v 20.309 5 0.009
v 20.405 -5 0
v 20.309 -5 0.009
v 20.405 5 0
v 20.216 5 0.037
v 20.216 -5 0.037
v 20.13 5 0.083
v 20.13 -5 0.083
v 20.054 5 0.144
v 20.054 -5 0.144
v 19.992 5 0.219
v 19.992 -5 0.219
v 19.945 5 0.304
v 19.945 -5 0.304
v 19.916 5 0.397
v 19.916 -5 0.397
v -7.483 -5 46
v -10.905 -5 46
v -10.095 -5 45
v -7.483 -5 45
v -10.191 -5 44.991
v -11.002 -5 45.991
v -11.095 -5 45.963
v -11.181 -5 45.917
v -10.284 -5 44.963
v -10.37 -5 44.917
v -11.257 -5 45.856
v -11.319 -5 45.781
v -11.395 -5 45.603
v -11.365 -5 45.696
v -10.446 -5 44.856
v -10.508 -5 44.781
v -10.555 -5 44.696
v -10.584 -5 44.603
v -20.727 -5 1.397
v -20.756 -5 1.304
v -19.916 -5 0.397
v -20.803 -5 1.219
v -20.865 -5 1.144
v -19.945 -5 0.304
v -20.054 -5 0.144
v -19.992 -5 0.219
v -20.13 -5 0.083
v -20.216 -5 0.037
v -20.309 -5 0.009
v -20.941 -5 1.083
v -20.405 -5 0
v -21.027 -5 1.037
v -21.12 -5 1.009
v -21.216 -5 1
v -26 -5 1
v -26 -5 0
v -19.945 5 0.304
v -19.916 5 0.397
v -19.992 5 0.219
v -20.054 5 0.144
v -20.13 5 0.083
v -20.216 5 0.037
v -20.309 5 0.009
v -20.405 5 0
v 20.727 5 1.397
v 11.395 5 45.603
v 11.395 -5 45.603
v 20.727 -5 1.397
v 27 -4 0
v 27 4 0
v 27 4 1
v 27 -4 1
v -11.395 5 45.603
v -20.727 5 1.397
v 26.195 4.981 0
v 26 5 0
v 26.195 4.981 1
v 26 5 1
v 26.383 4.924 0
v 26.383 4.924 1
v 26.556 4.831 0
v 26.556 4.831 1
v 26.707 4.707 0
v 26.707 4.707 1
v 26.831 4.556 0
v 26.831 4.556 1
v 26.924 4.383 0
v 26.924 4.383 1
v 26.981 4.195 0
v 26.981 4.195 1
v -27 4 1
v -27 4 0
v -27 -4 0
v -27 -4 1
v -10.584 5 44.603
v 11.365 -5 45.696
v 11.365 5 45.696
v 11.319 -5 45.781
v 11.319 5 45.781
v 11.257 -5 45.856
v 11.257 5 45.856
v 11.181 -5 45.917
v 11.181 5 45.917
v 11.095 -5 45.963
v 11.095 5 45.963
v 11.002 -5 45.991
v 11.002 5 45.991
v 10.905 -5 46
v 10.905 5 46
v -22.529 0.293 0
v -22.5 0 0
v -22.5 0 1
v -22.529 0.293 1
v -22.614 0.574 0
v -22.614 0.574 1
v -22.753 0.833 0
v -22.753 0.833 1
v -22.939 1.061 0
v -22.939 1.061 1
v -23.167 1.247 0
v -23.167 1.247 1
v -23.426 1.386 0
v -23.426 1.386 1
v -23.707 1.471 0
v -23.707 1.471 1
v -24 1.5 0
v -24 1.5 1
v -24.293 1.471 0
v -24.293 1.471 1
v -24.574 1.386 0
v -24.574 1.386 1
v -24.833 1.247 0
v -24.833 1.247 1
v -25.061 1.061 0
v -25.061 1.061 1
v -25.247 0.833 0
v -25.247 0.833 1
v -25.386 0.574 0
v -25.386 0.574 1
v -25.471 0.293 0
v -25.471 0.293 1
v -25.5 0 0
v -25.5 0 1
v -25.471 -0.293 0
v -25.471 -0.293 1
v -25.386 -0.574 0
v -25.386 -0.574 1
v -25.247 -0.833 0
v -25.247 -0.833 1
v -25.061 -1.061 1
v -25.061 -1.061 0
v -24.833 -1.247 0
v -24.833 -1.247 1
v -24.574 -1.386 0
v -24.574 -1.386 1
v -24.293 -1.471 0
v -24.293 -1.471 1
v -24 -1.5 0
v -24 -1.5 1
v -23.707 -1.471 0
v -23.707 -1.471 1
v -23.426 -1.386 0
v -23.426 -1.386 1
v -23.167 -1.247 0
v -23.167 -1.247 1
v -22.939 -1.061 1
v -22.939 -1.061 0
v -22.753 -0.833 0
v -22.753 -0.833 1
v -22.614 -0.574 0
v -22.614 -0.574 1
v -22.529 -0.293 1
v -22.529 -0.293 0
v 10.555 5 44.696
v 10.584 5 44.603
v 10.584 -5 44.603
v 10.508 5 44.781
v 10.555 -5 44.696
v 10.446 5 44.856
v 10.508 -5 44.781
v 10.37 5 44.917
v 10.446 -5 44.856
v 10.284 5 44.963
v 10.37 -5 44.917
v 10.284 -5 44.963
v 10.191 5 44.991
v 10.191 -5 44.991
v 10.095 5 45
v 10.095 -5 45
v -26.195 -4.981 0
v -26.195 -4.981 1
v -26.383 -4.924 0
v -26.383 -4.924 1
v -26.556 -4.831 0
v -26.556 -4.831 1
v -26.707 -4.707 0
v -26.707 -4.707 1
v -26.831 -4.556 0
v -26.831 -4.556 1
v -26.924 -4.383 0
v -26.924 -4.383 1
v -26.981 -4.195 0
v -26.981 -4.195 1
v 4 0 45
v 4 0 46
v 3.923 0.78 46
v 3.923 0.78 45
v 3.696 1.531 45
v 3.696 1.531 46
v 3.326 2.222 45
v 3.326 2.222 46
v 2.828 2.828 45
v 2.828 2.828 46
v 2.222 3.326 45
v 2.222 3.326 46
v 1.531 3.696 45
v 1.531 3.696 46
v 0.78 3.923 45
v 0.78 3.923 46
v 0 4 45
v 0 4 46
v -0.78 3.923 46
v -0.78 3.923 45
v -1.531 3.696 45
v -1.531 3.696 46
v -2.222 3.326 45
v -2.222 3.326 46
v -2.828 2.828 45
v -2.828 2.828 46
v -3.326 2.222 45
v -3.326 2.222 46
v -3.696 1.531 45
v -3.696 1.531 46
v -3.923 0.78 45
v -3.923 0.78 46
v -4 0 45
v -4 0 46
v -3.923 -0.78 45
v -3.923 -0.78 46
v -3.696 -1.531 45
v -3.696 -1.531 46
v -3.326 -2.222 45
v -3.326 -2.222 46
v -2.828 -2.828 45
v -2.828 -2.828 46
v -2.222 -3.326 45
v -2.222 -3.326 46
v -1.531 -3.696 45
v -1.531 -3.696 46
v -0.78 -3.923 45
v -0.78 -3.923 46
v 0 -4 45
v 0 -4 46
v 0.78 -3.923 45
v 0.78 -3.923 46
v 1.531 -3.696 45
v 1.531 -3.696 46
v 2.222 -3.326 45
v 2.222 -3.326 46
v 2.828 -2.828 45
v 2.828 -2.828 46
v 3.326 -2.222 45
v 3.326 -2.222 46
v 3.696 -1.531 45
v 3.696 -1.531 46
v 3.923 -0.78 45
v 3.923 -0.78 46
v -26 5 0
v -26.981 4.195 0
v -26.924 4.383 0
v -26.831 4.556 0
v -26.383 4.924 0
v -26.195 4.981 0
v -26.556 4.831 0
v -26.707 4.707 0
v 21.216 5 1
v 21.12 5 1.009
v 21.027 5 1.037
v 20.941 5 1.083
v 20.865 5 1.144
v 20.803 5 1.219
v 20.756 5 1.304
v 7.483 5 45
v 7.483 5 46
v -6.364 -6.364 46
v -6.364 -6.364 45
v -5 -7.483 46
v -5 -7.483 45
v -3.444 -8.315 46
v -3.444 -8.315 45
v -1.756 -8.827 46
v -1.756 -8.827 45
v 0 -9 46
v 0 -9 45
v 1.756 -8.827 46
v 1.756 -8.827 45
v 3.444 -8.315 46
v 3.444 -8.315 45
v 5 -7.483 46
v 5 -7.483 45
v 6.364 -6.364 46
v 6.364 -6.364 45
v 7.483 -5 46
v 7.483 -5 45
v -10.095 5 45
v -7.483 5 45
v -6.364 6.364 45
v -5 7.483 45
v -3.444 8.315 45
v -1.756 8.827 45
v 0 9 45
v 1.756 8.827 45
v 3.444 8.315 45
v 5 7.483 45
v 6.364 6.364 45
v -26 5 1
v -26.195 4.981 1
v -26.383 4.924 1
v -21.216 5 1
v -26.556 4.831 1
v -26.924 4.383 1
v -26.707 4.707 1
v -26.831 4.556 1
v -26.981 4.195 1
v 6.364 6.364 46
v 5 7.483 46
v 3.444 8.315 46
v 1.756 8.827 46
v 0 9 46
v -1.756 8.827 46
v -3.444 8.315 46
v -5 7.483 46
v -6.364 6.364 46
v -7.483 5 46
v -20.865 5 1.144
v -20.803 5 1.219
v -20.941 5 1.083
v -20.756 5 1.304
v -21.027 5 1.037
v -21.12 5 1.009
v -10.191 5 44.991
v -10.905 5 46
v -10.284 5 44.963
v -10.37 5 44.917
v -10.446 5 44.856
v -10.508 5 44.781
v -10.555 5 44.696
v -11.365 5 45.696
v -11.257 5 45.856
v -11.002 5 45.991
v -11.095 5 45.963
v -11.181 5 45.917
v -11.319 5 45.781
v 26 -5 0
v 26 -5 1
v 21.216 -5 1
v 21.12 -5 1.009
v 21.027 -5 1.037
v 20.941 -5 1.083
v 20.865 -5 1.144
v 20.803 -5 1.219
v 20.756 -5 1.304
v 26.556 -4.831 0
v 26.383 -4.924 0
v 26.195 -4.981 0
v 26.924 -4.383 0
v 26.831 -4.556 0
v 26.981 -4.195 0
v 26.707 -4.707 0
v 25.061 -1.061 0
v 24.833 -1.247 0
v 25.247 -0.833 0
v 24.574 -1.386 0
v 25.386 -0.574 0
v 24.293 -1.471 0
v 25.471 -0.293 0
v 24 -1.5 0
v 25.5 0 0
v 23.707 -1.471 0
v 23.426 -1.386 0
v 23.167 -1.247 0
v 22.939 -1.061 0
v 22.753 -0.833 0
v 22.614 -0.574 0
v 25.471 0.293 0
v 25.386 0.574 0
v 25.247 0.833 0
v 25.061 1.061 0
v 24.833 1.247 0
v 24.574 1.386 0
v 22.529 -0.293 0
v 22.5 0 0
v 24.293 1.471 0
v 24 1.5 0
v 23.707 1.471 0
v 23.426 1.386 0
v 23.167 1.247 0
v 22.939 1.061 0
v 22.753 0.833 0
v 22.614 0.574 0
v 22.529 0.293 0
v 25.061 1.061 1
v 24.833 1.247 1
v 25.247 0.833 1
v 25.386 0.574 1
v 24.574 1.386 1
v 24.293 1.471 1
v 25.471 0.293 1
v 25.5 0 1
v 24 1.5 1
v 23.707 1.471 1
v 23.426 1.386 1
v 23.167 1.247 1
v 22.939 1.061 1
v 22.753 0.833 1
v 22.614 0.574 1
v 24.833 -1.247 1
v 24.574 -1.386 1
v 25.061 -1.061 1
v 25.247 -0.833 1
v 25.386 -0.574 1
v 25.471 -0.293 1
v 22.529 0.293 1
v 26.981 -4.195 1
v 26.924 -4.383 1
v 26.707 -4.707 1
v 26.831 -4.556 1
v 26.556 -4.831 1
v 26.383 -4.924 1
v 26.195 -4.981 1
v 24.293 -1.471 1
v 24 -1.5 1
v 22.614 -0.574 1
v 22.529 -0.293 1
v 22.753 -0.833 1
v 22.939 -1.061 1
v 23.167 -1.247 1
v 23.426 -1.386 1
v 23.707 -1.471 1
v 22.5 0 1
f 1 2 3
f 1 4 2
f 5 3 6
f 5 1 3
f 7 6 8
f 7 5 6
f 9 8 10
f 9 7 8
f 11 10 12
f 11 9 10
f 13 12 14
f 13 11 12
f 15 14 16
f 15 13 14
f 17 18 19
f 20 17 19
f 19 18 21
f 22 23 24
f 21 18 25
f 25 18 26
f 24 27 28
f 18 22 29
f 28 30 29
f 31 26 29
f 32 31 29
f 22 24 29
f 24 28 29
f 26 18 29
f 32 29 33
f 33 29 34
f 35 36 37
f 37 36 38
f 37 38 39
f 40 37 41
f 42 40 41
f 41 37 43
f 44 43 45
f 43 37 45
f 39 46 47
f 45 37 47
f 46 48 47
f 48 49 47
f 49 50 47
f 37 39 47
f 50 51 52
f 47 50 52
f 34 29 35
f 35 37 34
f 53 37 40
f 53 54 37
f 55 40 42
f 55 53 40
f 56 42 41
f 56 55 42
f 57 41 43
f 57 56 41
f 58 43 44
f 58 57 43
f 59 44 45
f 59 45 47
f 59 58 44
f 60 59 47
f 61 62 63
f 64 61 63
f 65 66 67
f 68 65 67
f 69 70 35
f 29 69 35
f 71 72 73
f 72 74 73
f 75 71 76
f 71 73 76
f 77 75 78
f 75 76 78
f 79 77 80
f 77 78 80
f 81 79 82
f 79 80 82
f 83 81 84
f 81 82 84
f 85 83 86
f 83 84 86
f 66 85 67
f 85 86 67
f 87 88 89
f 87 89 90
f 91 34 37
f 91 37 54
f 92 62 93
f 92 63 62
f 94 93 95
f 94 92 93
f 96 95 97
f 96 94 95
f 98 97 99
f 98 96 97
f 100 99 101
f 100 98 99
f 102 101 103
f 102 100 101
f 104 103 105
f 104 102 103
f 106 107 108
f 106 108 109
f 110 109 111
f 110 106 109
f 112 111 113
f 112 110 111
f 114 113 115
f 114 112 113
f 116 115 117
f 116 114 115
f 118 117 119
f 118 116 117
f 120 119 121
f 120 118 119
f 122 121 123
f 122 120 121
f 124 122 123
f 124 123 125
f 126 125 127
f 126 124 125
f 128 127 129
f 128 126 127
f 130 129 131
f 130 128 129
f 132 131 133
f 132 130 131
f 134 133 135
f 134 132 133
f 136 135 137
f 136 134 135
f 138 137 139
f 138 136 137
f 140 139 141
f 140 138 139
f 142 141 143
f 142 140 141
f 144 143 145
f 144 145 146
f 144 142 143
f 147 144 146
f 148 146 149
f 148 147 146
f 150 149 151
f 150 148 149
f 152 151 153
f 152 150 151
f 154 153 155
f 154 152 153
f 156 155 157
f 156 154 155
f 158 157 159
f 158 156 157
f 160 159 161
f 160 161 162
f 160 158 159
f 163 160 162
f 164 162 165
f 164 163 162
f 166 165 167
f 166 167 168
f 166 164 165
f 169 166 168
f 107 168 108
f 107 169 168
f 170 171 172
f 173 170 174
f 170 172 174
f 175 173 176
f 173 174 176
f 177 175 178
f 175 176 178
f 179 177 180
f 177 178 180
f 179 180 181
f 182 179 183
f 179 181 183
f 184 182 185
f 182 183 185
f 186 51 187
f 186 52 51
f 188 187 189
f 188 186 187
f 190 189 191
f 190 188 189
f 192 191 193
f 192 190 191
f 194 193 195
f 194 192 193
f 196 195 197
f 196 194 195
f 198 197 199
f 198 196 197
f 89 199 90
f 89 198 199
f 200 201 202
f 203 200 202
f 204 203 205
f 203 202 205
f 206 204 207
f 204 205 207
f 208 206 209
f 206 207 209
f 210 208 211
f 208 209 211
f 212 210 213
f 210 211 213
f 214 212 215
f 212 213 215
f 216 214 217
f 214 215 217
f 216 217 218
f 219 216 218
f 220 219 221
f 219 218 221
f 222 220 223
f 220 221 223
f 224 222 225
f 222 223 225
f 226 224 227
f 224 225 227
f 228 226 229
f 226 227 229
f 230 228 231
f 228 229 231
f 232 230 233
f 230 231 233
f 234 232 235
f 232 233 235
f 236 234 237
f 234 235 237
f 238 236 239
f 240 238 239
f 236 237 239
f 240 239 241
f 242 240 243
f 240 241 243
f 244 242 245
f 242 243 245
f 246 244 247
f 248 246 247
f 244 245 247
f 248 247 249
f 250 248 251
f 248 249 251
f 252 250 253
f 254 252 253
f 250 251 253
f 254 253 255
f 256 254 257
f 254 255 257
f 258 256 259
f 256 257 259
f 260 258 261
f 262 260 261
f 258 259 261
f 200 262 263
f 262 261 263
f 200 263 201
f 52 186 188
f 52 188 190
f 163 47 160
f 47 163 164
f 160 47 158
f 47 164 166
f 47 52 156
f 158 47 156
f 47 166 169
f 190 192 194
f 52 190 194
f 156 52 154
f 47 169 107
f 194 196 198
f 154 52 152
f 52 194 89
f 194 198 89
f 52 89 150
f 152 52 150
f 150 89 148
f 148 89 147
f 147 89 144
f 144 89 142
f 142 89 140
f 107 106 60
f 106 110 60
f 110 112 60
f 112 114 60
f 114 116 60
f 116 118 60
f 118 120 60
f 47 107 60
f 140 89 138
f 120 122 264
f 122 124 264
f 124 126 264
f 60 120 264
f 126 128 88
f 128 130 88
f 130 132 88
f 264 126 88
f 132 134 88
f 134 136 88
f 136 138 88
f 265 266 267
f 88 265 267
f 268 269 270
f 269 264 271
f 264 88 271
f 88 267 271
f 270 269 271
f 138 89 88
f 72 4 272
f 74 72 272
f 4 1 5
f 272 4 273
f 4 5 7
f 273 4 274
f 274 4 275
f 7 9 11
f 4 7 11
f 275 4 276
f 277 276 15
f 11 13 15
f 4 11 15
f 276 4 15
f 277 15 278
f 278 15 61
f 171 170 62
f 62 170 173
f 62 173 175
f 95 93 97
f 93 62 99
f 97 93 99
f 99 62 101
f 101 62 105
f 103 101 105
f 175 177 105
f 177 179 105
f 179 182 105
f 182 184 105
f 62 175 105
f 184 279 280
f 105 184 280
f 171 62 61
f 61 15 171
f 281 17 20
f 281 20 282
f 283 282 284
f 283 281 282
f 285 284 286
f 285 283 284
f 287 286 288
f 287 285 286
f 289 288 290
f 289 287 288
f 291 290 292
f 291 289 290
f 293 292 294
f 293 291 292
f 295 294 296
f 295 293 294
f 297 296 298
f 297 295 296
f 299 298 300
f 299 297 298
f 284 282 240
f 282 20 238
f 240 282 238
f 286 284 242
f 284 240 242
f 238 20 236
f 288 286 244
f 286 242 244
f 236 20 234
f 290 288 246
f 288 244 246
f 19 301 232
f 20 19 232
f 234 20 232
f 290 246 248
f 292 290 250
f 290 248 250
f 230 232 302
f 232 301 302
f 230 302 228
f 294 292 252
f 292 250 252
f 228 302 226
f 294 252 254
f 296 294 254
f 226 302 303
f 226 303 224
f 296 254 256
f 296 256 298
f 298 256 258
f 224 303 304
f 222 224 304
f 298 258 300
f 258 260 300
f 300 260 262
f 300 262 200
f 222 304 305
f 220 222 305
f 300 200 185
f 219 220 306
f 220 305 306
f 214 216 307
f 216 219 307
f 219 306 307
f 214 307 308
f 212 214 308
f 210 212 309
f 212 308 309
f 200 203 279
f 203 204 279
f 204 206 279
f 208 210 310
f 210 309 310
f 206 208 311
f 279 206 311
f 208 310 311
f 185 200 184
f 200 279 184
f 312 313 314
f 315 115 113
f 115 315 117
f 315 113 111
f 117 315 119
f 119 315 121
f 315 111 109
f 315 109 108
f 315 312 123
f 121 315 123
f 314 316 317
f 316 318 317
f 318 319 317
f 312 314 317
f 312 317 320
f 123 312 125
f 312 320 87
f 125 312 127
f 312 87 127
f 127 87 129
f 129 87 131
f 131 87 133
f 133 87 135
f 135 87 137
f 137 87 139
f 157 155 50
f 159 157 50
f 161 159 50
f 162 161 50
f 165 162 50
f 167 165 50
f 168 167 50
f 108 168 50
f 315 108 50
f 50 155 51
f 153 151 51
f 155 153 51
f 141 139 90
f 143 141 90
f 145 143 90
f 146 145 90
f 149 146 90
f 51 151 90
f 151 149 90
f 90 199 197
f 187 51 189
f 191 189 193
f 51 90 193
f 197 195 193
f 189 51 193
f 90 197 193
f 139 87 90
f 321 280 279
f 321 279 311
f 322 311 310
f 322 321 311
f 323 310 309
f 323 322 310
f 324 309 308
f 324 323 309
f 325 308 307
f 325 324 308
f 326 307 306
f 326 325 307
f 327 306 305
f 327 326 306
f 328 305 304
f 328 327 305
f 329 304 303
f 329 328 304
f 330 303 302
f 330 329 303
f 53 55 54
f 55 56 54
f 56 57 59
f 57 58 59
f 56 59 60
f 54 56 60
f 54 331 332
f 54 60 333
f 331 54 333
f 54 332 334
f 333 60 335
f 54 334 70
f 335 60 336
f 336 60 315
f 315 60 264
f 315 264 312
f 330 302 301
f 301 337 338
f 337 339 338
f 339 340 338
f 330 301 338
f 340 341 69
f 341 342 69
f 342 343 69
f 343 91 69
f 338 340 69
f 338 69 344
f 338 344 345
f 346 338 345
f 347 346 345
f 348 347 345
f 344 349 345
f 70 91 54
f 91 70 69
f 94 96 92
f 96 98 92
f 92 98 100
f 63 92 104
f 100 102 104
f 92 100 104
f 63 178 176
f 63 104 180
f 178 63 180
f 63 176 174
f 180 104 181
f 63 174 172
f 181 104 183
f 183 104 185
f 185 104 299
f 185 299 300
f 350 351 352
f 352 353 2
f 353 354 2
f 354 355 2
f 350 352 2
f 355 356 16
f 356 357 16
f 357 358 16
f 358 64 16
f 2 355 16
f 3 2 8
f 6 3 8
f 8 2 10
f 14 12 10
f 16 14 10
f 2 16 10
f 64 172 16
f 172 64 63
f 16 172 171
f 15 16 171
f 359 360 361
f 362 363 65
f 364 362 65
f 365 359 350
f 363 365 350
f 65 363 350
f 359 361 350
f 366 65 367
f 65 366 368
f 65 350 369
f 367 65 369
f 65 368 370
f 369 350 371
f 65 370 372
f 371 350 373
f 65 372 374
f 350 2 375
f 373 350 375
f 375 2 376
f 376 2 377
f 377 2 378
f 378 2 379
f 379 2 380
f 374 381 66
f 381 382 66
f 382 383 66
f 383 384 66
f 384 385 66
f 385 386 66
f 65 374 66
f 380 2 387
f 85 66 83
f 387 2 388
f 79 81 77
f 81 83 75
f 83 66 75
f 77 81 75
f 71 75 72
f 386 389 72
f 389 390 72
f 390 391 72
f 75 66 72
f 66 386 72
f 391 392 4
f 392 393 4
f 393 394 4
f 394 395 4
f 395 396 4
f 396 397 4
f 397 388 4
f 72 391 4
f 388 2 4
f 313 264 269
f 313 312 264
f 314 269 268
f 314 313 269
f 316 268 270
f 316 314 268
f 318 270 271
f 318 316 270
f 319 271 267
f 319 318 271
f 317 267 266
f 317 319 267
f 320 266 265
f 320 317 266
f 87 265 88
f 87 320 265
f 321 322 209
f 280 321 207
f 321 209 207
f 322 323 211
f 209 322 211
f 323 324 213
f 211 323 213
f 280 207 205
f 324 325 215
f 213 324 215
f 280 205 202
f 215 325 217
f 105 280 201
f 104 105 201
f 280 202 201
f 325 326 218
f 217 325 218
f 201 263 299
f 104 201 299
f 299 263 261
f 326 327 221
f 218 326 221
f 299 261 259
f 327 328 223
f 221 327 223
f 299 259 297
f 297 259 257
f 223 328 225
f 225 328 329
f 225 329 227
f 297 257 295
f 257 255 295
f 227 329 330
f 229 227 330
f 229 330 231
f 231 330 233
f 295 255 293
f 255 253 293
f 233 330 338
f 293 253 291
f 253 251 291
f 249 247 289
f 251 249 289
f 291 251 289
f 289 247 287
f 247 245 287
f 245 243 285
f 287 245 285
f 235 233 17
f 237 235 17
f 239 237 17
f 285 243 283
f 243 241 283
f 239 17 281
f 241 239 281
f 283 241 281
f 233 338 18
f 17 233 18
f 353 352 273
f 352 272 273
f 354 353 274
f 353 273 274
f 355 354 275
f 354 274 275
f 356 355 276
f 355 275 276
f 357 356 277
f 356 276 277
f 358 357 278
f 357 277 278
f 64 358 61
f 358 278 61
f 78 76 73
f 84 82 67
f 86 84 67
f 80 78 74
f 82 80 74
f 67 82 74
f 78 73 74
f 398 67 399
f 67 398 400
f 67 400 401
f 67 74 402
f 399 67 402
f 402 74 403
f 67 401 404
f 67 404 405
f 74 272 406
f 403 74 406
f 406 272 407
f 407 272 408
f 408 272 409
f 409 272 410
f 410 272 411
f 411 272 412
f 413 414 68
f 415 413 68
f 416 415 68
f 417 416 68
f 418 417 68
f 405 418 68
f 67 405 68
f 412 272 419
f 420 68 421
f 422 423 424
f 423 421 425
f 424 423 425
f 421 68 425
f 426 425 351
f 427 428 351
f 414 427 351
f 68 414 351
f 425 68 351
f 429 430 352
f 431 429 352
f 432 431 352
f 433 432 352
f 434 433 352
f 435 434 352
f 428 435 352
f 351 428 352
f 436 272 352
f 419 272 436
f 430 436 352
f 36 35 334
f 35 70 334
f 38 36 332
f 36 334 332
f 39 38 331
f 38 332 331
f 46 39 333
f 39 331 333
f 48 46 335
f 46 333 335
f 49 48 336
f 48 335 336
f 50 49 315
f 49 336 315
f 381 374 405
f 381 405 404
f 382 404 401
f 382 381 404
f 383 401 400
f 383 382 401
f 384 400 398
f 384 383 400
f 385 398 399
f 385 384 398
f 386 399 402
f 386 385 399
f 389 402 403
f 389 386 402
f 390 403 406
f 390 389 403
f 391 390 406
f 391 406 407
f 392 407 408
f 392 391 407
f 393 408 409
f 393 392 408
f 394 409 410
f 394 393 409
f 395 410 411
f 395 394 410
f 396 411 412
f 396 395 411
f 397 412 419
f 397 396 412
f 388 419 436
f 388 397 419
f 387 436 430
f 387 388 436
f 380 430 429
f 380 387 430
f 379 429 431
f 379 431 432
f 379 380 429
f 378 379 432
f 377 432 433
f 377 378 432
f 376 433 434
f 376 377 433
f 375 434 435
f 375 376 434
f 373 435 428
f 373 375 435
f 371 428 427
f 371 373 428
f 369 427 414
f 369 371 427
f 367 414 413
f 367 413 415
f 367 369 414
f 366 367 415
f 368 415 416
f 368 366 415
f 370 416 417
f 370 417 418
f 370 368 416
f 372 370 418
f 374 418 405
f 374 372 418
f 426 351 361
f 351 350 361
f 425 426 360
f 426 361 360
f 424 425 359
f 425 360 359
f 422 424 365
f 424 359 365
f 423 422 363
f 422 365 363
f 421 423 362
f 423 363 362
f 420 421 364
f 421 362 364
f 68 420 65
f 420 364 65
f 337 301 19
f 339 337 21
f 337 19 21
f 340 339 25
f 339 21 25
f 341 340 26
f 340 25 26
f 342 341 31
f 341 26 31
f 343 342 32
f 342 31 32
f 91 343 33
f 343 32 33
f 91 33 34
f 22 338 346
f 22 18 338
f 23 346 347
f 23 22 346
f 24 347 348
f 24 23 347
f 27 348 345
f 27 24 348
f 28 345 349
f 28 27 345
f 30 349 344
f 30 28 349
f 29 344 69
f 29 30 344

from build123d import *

# Parameters (mm, degrees)
F2_W      = 10
F2_H      = 1
F4_R      = 0.5
F5_R      = 9
F6_DEPTH  = 1
F7_R      = 4
F8_DEPTH  = 1
F9_R      = 1.5
F10_DEPTH = 1
F11_R     = 1


with BuildPart() as f3:
    # F3: sweep along a path in F0
    with BuildLine(Plane.XZ) as f3_path:
        Line((27, 0), (20, 0))
        Line((20, 0), (10.5, 45))
        Line((10.5, 45), (-10.5, 45))
        Line((-10.5, 45), (-20, 0))
        Line((-20, 0), (-27, 0))
    # F2 (on plane+point) → F3 (sweep)
    with BuildSketch(Plane.YZ.offset(27)):
        with Locations((0, 0.5)):
            Rectangle(F2_W, F2_H)
    sweep(path=f3_path.line, transition=Transition.RIGHT)

    # F4
    f4_edges = [f3.edges().sort_by_distance(p)[0] for p in [
        (20.81093, 0, 1),
        (11.31093, 0, 46),
        (-11.31093, 0, 46),
        (-20.81093, 0, 1),
        (20, 0, 0),
        (10.5, 0, 45),
        (-20, 0, 0),
        (-10.5, 0, 45),
    ]]
    fillet(f4_edges, radius=F4_R)

    # F5 (on face) → F6 (join, through all)
    with BuildSketch(Plane.XY.offset(46)):
        Circle(F5_R)
    extrude(amount=-F6_DEPTH)

    # F7 (on face) → F8 (cut, through all)
    with BuildSketch(Plane.XY.offset(46)):
        Circle(F7_R)
    extrude(amount=-F8_DEPTH, mode=Mode.SUBTRACT)

    # F9 (on Top) → F10 (cut, through all)
    with BuildSketch(Plane.XY):
        with Locations((-24, 0)):
            Circle(F9_R)
        with Locations((24, 0)):
            Circle(F9_R)
    extrude(amount=F10_DEPTH, mode=Mode.SUBTRACT)

    # F11
    f11_edges = [f3.edges().sort_by_distance(p)[0] for p in [
        (27, -5, 0.5),
        (27, 5, 0.5),
        (-27, 5, 0.5),
        (-27, -5, 0.5),
    ]]
    fillet(f11_edges, radius=F11_R)


solid = f3.part
